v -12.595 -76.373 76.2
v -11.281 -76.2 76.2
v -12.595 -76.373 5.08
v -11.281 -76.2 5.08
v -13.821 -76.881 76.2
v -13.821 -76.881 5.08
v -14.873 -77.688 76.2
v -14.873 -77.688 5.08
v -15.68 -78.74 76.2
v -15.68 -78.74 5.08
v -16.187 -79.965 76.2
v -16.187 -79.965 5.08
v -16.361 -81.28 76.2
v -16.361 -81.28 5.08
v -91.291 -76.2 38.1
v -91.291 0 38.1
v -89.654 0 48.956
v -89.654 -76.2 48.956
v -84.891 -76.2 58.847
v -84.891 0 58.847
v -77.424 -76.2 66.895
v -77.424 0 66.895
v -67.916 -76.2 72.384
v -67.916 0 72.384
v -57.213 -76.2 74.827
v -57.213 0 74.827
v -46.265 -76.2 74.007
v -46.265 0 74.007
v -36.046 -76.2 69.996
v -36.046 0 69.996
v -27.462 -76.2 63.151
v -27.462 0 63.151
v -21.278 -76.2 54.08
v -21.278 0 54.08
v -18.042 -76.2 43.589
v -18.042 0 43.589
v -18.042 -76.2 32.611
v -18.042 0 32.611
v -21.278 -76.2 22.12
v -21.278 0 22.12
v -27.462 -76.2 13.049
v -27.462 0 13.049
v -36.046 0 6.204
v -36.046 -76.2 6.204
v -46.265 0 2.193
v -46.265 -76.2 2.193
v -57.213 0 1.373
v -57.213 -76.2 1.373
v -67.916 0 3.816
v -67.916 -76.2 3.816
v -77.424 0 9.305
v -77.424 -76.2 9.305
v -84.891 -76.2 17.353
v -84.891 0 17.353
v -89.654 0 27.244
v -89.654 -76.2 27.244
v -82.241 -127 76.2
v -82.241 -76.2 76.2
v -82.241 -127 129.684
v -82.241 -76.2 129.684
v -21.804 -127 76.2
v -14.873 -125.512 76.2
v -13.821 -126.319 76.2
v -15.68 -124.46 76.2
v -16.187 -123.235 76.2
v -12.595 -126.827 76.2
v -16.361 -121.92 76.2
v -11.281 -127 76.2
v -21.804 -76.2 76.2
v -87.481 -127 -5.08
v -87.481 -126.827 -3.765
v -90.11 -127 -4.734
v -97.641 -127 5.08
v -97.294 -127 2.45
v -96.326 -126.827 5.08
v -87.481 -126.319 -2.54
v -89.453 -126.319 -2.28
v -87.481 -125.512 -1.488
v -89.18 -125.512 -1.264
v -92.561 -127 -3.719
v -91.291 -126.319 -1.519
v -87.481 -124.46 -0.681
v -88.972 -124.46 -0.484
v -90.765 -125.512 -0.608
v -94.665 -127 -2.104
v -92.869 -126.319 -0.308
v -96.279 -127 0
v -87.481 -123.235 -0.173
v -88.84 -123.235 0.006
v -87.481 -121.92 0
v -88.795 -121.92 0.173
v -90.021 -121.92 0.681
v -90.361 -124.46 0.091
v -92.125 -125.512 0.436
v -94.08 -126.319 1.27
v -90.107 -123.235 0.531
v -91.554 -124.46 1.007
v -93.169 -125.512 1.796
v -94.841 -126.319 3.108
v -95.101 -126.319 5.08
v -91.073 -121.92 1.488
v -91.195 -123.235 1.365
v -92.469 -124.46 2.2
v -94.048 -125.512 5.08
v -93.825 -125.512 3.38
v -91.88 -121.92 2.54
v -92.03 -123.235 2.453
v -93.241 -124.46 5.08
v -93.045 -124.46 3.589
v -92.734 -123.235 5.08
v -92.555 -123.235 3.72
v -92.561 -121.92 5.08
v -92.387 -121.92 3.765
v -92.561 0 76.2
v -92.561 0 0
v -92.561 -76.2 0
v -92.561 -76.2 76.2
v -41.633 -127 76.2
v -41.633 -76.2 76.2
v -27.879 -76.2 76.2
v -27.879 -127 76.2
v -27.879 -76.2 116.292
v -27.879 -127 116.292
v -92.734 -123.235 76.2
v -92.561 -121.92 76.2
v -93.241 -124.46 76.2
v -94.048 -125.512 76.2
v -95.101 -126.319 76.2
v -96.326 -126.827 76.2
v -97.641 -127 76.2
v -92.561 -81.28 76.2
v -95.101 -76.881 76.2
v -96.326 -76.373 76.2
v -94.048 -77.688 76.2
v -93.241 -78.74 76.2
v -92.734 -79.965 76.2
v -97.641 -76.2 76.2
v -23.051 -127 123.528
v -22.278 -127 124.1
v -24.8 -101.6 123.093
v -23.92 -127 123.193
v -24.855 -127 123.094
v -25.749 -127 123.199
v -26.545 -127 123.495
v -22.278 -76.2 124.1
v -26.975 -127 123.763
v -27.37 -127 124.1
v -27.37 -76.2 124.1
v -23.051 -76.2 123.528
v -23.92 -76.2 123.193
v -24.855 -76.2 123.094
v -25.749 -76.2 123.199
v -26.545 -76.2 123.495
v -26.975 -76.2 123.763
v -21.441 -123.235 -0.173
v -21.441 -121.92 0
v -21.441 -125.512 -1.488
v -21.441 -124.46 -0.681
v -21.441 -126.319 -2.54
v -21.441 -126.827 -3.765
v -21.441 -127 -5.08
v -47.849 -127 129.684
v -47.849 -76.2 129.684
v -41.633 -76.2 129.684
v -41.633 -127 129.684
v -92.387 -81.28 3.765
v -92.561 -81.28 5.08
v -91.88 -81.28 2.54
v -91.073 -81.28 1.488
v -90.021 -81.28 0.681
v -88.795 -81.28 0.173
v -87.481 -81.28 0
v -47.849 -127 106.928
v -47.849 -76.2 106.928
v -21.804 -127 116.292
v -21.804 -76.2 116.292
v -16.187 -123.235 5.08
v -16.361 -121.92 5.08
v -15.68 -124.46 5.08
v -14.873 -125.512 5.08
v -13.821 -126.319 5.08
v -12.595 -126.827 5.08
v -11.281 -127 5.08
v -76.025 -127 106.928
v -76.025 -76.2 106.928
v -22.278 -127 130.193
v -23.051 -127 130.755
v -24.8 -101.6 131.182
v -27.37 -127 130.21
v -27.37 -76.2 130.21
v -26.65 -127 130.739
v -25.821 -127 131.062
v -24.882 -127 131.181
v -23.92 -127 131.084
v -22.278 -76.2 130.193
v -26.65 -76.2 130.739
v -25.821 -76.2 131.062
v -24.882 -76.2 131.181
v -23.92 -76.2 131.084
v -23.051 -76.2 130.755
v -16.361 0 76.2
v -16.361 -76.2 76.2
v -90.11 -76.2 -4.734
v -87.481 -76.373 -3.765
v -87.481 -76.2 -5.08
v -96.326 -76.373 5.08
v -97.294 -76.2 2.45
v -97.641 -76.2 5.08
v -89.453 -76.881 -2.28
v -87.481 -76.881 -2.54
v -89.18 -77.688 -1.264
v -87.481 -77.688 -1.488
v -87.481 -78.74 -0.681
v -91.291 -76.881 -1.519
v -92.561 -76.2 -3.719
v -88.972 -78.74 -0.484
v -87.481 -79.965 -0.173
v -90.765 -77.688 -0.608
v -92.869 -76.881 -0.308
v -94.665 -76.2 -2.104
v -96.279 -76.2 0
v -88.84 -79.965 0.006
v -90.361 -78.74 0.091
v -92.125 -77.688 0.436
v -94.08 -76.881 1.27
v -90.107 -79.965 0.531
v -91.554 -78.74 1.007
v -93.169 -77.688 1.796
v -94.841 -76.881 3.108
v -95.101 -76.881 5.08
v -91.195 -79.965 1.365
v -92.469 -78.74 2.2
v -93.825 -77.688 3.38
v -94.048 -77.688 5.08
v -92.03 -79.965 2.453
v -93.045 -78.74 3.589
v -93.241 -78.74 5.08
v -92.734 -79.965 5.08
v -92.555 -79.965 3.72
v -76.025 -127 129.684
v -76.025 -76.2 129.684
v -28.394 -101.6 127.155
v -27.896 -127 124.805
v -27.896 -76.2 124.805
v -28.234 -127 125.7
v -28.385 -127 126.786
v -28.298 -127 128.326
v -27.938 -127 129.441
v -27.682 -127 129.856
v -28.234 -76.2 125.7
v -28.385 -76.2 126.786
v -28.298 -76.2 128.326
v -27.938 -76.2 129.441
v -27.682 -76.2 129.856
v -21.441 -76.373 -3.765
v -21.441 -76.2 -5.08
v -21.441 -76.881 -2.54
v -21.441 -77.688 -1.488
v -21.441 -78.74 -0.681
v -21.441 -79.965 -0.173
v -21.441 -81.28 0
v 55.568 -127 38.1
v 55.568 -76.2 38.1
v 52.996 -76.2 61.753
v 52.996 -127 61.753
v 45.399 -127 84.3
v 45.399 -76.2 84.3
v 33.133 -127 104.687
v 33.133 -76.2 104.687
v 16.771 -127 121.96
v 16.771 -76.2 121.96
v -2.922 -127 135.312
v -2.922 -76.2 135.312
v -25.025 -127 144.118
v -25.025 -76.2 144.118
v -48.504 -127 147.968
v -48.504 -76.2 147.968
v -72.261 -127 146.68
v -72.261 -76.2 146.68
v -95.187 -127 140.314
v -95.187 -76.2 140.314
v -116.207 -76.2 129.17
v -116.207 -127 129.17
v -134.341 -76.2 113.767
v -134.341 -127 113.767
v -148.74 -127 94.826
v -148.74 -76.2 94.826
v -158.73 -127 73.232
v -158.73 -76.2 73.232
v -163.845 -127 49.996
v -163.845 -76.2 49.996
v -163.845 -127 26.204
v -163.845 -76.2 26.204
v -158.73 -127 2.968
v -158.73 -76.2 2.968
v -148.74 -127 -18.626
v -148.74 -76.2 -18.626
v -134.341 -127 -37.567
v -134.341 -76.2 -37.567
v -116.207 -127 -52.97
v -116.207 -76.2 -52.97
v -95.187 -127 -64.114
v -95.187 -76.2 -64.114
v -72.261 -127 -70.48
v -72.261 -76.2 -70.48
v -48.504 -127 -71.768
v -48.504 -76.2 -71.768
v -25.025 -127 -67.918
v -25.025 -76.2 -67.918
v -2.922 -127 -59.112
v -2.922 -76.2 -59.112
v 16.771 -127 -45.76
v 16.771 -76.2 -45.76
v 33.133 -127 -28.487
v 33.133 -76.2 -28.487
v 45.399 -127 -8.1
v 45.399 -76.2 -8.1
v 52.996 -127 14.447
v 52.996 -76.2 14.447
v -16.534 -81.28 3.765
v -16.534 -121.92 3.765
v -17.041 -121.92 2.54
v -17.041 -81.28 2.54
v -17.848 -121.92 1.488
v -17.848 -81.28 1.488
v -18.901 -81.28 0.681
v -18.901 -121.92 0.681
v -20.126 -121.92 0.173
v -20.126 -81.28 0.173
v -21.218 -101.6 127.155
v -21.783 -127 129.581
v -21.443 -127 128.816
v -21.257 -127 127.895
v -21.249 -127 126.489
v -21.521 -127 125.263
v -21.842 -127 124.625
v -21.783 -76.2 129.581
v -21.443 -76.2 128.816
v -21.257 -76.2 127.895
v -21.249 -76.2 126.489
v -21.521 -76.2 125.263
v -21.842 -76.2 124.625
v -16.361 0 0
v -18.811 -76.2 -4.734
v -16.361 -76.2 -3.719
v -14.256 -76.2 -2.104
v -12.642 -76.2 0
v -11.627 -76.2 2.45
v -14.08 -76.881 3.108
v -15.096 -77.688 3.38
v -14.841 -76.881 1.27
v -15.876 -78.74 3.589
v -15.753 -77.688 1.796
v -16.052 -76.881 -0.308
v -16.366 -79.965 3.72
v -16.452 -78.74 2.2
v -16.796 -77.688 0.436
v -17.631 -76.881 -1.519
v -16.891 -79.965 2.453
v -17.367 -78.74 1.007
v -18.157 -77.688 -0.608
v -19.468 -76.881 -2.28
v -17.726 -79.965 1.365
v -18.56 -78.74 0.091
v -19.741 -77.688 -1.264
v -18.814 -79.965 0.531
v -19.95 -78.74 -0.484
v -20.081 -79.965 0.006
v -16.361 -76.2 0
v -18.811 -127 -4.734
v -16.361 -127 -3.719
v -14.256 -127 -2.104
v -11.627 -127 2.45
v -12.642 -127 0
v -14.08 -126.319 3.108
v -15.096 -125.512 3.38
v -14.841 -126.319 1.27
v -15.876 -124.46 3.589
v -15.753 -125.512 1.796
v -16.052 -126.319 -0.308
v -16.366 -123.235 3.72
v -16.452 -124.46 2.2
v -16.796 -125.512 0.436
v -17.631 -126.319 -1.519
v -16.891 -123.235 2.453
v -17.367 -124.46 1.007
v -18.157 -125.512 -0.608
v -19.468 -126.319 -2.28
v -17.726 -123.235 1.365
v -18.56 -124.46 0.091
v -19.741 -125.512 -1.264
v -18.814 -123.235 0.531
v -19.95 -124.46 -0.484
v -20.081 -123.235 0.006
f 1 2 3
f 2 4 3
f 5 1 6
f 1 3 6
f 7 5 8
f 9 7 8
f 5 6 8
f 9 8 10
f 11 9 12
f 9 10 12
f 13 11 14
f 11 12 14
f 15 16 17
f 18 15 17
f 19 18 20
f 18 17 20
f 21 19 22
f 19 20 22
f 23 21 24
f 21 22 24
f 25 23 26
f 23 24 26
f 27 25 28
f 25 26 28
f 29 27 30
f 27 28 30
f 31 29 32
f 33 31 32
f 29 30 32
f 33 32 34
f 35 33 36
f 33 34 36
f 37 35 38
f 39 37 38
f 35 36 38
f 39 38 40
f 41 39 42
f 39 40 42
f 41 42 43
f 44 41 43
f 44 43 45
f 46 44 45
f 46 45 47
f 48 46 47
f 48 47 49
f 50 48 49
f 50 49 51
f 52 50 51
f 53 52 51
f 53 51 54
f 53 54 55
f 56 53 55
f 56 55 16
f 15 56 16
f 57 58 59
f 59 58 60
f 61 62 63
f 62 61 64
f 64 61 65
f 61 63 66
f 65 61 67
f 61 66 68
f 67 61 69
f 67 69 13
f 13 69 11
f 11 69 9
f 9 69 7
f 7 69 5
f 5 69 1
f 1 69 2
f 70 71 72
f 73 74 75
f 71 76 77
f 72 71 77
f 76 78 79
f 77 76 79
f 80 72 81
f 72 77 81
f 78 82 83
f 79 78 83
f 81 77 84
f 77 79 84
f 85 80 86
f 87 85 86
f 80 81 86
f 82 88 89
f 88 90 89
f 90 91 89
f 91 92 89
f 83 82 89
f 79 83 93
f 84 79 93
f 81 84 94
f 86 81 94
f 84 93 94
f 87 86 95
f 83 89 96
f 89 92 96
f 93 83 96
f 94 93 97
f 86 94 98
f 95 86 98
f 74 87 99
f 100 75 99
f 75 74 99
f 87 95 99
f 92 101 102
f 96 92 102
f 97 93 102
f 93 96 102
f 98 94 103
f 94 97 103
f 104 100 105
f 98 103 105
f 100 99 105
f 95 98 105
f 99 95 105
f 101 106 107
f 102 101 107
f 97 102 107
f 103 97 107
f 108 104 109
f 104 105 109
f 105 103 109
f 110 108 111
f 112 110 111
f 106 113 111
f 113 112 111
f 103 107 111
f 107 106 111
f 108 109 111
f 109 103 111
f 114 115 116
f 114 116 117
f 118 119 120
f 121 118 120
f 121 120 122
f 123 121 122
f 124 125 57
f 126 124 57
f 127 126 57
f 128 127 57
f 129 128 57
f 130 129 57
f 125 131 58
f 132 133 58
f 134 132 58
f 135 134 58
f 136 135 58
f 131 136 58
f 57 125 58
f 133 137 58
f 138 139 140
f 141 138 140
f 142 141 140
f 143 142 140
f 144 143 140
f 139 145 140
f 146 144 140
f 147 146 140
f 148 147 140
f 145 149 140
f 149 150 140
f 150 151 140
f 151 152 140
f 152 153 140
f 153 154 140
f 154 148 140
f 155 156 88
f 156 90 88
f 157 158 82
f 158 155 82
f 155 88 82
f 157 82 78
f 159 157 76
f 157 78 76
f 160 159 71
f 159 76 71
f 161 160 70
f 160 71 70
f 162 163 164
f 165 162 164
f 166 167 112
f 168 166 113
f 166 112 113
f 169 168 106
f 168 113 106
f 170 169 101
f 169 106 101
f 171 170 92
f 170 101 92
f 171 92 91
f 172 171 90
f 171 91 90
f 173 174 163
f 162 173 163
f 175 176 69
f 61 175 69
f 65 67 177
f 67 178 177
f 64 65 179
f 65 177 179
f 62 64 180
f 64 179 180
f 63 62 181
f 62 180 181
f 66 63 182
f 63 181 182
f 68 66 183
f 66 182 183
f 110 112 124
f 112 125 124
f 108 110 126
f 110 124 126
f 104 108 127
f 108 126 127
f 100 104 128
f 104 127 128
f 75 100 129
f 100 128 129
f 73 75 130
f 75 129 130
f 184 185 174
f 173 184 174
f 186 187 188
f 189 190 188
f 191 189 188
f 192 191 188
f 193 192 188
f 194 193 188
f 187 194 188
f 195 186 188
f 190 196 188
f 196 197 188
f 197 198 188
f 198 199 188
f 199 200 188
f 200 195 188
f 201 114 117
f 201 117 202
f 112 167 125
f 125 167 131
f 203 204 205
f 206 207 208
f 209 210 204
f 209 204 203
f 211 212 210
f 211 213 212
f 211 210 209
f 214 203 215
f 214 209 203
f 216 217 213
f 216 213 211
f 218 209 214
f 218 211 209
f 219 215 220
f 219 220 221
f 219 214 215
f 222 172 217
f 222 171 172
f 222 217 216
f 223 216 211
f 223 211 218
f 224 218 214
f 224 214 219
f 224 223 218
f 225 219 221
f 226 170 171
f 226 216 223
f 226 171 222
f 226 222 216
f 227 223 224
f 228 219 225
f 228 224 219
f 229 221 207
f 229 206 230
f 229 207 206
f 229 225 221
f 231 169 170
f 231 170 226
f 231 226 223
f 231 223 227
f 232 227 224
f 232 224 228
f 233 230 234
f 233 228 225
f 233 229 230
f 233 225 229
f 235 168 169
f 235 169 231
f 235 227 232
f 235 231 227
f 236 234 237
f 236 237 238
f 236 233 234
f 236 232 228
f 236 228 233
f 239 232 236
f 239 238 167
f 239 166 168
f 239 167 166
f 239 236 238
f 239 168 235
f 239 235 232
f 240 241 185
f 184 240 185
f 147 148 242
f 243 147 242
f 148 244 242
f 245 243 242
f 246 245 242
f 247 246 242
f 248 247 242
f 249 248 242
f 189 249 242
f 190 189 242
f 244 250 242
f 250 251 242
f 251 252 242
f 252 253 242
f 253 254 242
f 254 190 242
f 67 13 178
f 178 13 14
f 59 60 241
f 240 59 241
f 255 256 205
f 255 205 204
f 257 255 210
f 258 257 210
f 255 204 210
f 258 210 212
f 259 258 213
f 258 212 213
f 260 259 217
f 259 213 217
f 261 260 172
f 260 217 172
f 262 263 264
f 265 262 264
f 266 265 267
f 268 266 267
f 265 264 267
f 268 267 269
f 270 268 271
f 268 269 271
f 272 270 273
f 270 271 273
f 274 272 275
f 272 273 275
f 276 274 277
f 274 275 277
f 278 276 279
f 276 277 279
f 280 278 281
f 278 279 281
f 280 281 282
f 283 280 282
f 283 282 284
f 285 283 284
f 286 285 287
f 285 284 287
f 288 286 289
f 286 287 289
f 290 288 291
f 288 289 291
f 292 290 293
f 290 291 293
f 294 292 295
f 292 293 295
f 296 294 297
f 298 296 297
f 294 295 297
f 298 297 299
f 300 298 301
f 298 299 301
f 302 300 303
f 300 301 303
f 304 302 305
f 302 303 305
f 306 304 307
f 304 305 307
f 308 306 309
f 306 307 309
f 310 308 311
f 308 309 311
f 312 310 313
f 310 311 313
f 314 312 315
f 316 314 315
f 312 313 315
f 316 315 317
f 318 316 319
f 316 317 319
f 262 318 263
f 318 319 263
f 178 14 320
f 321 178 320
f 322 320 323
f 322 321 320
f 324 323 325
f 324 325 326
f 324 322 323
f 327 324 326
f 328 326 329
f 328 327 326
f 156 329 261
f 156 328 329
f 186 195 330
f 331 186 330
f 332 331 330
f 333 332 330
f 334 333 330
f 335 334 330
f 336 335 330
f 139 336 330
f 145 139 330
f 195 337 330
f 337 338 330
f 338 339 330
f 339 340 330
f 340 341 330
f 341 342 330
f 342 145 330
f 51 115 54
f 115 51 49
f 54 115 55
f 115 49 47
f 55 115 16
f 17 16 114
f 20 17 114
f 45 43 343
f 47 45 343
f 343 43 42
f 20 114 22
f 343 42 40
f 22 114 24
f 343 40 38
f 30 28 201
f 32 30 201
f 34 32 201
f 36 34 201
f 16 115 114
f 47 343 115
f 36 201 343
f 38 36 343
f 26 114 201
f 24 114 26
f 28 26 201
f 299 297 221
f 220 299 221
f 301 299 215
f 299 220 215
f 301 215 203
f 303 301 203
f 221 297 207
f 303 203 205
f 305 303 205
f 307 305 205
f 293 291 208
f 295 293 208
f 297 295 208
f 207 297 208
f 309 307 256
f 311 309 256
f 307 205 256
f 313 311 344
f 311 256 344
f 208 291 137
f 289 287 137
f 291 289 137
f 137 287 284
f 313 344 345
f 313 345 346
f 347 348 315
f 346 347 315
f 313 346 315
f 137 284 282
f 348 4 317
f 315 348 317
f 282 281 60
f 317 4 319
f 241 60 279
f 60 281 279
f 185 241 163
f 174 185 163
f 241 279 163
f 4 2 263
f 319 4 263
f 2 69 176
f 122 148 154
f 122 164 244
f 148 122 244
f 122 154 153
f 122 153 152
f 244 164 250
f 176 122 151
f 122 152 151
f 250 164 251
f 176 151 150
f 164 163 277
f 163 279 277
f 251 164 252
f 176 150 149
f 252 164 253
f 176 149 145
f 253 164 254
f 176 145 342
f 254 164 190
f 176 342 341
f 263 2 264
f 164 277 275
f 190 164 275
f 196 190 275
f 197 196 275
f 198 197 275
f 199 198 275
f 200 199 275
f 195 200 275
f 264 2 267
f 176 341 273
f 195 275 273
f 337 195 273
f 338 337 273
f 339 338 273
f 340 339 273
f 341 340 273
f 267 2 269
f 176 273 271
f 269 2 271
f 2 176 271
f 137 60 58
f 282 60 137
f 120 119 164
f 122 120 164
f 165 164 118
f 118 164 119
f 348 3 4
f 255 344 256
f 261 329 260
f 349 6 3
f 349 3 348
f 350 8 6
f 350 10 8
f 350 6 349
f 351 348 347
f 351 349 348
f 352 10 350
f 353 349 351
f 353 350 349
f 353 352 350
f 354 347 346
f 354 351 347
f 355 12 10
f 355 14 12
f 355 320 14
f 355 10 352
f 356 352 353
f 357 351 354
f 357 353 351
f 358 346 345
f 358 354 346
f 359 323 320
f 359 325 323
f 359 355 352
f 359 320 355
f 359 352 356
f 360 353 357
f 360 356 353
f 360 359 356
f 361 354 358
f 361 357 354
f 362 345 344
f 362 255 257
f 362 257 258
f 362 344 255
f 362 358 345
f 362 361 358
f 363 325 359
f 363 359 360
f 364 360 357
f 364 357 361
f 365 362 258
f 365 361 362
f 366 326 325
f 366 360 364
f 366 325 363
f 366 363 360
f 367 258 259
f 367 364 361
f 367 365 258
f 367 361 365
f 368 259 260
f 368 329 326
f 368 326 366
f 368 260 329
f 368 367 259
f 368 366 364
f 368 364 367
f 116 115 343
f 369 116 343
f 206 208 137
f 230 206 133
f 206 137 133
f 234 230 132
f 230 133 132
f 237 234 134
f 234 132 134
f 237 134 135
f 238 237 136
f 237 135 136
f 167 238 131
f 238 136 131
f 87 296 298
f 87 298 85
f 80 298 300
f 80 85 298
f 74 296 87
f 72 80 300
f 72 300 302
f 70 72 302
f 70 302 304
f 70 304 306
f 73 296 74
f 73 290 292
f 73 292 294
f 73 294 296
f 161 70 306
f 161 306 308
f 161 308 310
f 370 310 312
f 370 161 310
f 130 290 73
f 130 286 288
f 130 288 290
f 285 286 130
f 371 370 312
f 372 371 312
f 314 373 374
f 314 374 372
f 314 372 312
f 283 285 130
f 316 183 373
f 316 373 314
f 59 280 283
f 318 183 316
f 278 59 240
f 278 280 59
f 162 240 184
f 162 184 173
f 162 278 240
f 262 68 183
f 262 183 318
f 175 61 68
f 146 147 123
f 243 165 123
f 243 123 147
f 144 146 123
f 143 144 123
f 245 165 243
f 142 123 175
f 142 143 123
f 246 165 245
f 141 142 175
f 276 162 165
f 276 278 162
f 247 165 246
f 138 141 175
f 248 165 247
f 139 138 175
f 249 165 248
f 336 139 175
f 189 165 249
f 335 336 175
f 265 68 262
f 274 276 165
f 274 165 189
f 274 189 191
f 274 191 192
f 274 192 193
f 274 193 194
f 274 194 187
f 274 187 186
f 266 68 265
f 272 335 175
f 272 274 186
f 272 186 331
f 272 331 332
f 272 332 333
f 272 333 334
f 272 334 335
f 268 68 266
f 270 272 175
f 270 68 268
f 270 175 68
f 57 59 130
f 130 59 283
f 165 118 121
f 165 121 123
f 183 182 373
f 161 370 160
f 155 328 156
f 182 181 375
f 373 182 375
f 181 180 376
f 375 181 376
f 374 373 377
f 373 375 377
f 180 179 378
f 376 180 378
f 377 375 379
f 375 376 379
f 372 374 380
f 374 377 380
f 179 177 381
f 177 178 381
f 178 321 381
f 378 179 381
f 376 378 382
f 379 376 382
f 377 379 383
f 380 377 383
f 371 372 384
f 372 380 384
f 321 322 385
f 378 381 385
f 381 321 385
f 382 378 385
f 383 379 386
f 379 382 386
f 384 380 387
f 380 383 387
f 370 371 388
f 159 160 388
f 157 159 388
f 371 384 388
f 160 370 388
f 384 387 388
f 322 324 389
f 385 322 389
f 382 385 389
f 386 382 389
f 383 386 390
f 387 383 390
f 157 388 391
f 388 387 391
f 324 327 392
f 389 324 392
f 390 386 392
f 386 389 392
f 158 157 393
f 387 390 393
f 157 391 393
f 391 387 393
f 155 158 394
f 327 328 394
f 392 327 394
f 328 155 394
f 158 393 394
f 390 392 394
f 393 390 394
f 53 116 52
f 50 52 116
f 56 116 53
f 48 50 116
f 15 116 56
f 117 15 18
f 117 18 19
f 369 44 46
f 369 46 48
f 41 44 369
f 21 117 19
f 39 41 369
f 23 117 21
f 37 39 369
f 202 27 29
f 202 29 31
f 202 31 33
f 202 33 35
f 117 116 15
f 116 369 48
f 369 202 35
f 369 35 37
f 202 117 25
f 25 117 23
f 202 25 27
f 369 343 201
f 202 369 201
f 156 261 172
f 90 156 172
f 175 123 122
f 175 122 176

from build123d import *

# Parameters (mm, degrees)
F0_W     = 76.2
F0_H     = 76.2
F1_DEPTH = 76.2
F2_R     = 110.0290570582
F3_DEPTH = 50.8
F5_D     = 73.66
F6_R     = 5.08
F7_R     = 5.08


with BuildPart() as f1:
    # F0 (on Front) → F1 (new body)
    with BuildSketch(Plane.XZ):
        with Locations((-54.4605939882, 38.1)):
            Rectangle(F0_W, F0_H)
    extrude(amount=F1_DEPTH)

    # F5 (through all)
    with Locations(Plane.XZ.offset(76.2)):
        with Locations((-54.4605939882, 38.1)):
            Hole(F5_D / 2)


with BuildPart() as f3:
    # F2 (on face) → F3 (new body)
    with BuildSketch(Plane.XZ.offset(76.2)):
        with Locations((-54.4605939882, 38.1)):
            Circle(F2_R)
        Polygon((-41.6333082144, 129.6835716996), (-41.6333082144, 76.2), (-27.8790519774, 76.2), (-27.8790519774, 116.2921937122), (-21.8037677331, 116.2921937122), (-21.8037677331, 76.2), (-16.3605939882, 76.2), (-16.3605939882, 0), (-92.5605939882, 0), (-92.5605939882, 76.2), (-82.2405549261, 76.2), (-82.2405549261, 129.6835716996), (-76.024801682, 129.6835716996), (-76.024801682, 106.927593721), (-47.8490614585, 106.927593721), (-47.8490614585, 129.6835716996), align=None, mode=Mode.SUBTRACT)
        with BuildLine():
            add(Edge.make_bspline(
                [(-27.3698518528, 124.0999289549), (-28.3941049769, 125.1066234539), (-28.3941049769, 127.155129702)],
                knots=[0, 0, 0, 1, 1, 1], degree=2))
            add(Edge.make_bspline(
                [(-28.3941049769, 127.155129702), (-28.3941049769, 129.2387532), (-27.3698518528, 130.2103304491)],
                knots=[0, 0, 0, 1, 1, 1], degree=2))
            add(Edge.make_bspline(
                [(-27.3698518528, 130.2103304491), (-26.3455987288, 131.1819076982), (-24.8004397303, 131.1819076982)],
                knots=[0, 0, 0, 1, 1, 1], degree=2))
            add(Edge.make_bspline(
                [(-24.8004397303, 131.1819076982), (-23.3372209816, 131.1819076982), (-22.2778506076, 130.1927718241)],
                knots=[0, 0, 0, 1, 1, 1], degree=2))
            add(Edge.make_bspline(
                [(-22.2778506076, 130.1927718241), (-21.2184802336, 129.2036359501), (-21.2184802336, 127.155129702)],
                knots=[0, 0, 0, 1, 1, 1], degree=2))
            add(Edge.make_bspline(
                [(-21.2184802336, 127.155129702), (-21.2184802336, 125.1066234539), (-22.2778506076, 124.0999289549)],
                knots=[0, 0, 0, 1, 1, 1], degree=2))
            add(Edge.make_bspline(
                [(-22.2778506076, 124.0999289549), (-23.3372209816, 123.0932344558), (-24.8004397303, 123.0932344558)],
                knots=[0, 0, 0, 1, 1, 1], degree=2))
            add(Edge.make_bspline(
                [(-24.8004397303, 123.0932344558), (-26.3455987288, 123.0932344558), (-27.3698518528, 124.0999289549)],
                knots=[0, 0, 0, 1, 1, 1], degree=2))
        make_face(mode=Mode.SUBTRACT)
    extrude(amount=F3_DEPTH)

    # F6
    f6_edges = [f3.edges().sort_by_distance(p)[0] for p in [
        (55.568463, -101.6, 38.1),
        (-16.360594, -101.6, 0),
        (-16.360594, -127, 38.1),
        (-92.560594, -101.6, 0),
        (-54.460594, -127, 0),
        (-92.560594, -127, 38.1),
    ]]
    fillet(f6_edges, radius=F6_R)

    # F7
    f7_edges = [f3.edges().sort_by_distance(p)[0] for p in [
        (-54.460594, -76.2, 0),
        (-21.440594, -99.06, 0),
        (-87.480594, -99.06, 0),
        (-54.460594, -121.92, 0),
    ]]
    fillet(f7_edges, radius=F7_R)


solid = Compound([f1.part, f3.part])
